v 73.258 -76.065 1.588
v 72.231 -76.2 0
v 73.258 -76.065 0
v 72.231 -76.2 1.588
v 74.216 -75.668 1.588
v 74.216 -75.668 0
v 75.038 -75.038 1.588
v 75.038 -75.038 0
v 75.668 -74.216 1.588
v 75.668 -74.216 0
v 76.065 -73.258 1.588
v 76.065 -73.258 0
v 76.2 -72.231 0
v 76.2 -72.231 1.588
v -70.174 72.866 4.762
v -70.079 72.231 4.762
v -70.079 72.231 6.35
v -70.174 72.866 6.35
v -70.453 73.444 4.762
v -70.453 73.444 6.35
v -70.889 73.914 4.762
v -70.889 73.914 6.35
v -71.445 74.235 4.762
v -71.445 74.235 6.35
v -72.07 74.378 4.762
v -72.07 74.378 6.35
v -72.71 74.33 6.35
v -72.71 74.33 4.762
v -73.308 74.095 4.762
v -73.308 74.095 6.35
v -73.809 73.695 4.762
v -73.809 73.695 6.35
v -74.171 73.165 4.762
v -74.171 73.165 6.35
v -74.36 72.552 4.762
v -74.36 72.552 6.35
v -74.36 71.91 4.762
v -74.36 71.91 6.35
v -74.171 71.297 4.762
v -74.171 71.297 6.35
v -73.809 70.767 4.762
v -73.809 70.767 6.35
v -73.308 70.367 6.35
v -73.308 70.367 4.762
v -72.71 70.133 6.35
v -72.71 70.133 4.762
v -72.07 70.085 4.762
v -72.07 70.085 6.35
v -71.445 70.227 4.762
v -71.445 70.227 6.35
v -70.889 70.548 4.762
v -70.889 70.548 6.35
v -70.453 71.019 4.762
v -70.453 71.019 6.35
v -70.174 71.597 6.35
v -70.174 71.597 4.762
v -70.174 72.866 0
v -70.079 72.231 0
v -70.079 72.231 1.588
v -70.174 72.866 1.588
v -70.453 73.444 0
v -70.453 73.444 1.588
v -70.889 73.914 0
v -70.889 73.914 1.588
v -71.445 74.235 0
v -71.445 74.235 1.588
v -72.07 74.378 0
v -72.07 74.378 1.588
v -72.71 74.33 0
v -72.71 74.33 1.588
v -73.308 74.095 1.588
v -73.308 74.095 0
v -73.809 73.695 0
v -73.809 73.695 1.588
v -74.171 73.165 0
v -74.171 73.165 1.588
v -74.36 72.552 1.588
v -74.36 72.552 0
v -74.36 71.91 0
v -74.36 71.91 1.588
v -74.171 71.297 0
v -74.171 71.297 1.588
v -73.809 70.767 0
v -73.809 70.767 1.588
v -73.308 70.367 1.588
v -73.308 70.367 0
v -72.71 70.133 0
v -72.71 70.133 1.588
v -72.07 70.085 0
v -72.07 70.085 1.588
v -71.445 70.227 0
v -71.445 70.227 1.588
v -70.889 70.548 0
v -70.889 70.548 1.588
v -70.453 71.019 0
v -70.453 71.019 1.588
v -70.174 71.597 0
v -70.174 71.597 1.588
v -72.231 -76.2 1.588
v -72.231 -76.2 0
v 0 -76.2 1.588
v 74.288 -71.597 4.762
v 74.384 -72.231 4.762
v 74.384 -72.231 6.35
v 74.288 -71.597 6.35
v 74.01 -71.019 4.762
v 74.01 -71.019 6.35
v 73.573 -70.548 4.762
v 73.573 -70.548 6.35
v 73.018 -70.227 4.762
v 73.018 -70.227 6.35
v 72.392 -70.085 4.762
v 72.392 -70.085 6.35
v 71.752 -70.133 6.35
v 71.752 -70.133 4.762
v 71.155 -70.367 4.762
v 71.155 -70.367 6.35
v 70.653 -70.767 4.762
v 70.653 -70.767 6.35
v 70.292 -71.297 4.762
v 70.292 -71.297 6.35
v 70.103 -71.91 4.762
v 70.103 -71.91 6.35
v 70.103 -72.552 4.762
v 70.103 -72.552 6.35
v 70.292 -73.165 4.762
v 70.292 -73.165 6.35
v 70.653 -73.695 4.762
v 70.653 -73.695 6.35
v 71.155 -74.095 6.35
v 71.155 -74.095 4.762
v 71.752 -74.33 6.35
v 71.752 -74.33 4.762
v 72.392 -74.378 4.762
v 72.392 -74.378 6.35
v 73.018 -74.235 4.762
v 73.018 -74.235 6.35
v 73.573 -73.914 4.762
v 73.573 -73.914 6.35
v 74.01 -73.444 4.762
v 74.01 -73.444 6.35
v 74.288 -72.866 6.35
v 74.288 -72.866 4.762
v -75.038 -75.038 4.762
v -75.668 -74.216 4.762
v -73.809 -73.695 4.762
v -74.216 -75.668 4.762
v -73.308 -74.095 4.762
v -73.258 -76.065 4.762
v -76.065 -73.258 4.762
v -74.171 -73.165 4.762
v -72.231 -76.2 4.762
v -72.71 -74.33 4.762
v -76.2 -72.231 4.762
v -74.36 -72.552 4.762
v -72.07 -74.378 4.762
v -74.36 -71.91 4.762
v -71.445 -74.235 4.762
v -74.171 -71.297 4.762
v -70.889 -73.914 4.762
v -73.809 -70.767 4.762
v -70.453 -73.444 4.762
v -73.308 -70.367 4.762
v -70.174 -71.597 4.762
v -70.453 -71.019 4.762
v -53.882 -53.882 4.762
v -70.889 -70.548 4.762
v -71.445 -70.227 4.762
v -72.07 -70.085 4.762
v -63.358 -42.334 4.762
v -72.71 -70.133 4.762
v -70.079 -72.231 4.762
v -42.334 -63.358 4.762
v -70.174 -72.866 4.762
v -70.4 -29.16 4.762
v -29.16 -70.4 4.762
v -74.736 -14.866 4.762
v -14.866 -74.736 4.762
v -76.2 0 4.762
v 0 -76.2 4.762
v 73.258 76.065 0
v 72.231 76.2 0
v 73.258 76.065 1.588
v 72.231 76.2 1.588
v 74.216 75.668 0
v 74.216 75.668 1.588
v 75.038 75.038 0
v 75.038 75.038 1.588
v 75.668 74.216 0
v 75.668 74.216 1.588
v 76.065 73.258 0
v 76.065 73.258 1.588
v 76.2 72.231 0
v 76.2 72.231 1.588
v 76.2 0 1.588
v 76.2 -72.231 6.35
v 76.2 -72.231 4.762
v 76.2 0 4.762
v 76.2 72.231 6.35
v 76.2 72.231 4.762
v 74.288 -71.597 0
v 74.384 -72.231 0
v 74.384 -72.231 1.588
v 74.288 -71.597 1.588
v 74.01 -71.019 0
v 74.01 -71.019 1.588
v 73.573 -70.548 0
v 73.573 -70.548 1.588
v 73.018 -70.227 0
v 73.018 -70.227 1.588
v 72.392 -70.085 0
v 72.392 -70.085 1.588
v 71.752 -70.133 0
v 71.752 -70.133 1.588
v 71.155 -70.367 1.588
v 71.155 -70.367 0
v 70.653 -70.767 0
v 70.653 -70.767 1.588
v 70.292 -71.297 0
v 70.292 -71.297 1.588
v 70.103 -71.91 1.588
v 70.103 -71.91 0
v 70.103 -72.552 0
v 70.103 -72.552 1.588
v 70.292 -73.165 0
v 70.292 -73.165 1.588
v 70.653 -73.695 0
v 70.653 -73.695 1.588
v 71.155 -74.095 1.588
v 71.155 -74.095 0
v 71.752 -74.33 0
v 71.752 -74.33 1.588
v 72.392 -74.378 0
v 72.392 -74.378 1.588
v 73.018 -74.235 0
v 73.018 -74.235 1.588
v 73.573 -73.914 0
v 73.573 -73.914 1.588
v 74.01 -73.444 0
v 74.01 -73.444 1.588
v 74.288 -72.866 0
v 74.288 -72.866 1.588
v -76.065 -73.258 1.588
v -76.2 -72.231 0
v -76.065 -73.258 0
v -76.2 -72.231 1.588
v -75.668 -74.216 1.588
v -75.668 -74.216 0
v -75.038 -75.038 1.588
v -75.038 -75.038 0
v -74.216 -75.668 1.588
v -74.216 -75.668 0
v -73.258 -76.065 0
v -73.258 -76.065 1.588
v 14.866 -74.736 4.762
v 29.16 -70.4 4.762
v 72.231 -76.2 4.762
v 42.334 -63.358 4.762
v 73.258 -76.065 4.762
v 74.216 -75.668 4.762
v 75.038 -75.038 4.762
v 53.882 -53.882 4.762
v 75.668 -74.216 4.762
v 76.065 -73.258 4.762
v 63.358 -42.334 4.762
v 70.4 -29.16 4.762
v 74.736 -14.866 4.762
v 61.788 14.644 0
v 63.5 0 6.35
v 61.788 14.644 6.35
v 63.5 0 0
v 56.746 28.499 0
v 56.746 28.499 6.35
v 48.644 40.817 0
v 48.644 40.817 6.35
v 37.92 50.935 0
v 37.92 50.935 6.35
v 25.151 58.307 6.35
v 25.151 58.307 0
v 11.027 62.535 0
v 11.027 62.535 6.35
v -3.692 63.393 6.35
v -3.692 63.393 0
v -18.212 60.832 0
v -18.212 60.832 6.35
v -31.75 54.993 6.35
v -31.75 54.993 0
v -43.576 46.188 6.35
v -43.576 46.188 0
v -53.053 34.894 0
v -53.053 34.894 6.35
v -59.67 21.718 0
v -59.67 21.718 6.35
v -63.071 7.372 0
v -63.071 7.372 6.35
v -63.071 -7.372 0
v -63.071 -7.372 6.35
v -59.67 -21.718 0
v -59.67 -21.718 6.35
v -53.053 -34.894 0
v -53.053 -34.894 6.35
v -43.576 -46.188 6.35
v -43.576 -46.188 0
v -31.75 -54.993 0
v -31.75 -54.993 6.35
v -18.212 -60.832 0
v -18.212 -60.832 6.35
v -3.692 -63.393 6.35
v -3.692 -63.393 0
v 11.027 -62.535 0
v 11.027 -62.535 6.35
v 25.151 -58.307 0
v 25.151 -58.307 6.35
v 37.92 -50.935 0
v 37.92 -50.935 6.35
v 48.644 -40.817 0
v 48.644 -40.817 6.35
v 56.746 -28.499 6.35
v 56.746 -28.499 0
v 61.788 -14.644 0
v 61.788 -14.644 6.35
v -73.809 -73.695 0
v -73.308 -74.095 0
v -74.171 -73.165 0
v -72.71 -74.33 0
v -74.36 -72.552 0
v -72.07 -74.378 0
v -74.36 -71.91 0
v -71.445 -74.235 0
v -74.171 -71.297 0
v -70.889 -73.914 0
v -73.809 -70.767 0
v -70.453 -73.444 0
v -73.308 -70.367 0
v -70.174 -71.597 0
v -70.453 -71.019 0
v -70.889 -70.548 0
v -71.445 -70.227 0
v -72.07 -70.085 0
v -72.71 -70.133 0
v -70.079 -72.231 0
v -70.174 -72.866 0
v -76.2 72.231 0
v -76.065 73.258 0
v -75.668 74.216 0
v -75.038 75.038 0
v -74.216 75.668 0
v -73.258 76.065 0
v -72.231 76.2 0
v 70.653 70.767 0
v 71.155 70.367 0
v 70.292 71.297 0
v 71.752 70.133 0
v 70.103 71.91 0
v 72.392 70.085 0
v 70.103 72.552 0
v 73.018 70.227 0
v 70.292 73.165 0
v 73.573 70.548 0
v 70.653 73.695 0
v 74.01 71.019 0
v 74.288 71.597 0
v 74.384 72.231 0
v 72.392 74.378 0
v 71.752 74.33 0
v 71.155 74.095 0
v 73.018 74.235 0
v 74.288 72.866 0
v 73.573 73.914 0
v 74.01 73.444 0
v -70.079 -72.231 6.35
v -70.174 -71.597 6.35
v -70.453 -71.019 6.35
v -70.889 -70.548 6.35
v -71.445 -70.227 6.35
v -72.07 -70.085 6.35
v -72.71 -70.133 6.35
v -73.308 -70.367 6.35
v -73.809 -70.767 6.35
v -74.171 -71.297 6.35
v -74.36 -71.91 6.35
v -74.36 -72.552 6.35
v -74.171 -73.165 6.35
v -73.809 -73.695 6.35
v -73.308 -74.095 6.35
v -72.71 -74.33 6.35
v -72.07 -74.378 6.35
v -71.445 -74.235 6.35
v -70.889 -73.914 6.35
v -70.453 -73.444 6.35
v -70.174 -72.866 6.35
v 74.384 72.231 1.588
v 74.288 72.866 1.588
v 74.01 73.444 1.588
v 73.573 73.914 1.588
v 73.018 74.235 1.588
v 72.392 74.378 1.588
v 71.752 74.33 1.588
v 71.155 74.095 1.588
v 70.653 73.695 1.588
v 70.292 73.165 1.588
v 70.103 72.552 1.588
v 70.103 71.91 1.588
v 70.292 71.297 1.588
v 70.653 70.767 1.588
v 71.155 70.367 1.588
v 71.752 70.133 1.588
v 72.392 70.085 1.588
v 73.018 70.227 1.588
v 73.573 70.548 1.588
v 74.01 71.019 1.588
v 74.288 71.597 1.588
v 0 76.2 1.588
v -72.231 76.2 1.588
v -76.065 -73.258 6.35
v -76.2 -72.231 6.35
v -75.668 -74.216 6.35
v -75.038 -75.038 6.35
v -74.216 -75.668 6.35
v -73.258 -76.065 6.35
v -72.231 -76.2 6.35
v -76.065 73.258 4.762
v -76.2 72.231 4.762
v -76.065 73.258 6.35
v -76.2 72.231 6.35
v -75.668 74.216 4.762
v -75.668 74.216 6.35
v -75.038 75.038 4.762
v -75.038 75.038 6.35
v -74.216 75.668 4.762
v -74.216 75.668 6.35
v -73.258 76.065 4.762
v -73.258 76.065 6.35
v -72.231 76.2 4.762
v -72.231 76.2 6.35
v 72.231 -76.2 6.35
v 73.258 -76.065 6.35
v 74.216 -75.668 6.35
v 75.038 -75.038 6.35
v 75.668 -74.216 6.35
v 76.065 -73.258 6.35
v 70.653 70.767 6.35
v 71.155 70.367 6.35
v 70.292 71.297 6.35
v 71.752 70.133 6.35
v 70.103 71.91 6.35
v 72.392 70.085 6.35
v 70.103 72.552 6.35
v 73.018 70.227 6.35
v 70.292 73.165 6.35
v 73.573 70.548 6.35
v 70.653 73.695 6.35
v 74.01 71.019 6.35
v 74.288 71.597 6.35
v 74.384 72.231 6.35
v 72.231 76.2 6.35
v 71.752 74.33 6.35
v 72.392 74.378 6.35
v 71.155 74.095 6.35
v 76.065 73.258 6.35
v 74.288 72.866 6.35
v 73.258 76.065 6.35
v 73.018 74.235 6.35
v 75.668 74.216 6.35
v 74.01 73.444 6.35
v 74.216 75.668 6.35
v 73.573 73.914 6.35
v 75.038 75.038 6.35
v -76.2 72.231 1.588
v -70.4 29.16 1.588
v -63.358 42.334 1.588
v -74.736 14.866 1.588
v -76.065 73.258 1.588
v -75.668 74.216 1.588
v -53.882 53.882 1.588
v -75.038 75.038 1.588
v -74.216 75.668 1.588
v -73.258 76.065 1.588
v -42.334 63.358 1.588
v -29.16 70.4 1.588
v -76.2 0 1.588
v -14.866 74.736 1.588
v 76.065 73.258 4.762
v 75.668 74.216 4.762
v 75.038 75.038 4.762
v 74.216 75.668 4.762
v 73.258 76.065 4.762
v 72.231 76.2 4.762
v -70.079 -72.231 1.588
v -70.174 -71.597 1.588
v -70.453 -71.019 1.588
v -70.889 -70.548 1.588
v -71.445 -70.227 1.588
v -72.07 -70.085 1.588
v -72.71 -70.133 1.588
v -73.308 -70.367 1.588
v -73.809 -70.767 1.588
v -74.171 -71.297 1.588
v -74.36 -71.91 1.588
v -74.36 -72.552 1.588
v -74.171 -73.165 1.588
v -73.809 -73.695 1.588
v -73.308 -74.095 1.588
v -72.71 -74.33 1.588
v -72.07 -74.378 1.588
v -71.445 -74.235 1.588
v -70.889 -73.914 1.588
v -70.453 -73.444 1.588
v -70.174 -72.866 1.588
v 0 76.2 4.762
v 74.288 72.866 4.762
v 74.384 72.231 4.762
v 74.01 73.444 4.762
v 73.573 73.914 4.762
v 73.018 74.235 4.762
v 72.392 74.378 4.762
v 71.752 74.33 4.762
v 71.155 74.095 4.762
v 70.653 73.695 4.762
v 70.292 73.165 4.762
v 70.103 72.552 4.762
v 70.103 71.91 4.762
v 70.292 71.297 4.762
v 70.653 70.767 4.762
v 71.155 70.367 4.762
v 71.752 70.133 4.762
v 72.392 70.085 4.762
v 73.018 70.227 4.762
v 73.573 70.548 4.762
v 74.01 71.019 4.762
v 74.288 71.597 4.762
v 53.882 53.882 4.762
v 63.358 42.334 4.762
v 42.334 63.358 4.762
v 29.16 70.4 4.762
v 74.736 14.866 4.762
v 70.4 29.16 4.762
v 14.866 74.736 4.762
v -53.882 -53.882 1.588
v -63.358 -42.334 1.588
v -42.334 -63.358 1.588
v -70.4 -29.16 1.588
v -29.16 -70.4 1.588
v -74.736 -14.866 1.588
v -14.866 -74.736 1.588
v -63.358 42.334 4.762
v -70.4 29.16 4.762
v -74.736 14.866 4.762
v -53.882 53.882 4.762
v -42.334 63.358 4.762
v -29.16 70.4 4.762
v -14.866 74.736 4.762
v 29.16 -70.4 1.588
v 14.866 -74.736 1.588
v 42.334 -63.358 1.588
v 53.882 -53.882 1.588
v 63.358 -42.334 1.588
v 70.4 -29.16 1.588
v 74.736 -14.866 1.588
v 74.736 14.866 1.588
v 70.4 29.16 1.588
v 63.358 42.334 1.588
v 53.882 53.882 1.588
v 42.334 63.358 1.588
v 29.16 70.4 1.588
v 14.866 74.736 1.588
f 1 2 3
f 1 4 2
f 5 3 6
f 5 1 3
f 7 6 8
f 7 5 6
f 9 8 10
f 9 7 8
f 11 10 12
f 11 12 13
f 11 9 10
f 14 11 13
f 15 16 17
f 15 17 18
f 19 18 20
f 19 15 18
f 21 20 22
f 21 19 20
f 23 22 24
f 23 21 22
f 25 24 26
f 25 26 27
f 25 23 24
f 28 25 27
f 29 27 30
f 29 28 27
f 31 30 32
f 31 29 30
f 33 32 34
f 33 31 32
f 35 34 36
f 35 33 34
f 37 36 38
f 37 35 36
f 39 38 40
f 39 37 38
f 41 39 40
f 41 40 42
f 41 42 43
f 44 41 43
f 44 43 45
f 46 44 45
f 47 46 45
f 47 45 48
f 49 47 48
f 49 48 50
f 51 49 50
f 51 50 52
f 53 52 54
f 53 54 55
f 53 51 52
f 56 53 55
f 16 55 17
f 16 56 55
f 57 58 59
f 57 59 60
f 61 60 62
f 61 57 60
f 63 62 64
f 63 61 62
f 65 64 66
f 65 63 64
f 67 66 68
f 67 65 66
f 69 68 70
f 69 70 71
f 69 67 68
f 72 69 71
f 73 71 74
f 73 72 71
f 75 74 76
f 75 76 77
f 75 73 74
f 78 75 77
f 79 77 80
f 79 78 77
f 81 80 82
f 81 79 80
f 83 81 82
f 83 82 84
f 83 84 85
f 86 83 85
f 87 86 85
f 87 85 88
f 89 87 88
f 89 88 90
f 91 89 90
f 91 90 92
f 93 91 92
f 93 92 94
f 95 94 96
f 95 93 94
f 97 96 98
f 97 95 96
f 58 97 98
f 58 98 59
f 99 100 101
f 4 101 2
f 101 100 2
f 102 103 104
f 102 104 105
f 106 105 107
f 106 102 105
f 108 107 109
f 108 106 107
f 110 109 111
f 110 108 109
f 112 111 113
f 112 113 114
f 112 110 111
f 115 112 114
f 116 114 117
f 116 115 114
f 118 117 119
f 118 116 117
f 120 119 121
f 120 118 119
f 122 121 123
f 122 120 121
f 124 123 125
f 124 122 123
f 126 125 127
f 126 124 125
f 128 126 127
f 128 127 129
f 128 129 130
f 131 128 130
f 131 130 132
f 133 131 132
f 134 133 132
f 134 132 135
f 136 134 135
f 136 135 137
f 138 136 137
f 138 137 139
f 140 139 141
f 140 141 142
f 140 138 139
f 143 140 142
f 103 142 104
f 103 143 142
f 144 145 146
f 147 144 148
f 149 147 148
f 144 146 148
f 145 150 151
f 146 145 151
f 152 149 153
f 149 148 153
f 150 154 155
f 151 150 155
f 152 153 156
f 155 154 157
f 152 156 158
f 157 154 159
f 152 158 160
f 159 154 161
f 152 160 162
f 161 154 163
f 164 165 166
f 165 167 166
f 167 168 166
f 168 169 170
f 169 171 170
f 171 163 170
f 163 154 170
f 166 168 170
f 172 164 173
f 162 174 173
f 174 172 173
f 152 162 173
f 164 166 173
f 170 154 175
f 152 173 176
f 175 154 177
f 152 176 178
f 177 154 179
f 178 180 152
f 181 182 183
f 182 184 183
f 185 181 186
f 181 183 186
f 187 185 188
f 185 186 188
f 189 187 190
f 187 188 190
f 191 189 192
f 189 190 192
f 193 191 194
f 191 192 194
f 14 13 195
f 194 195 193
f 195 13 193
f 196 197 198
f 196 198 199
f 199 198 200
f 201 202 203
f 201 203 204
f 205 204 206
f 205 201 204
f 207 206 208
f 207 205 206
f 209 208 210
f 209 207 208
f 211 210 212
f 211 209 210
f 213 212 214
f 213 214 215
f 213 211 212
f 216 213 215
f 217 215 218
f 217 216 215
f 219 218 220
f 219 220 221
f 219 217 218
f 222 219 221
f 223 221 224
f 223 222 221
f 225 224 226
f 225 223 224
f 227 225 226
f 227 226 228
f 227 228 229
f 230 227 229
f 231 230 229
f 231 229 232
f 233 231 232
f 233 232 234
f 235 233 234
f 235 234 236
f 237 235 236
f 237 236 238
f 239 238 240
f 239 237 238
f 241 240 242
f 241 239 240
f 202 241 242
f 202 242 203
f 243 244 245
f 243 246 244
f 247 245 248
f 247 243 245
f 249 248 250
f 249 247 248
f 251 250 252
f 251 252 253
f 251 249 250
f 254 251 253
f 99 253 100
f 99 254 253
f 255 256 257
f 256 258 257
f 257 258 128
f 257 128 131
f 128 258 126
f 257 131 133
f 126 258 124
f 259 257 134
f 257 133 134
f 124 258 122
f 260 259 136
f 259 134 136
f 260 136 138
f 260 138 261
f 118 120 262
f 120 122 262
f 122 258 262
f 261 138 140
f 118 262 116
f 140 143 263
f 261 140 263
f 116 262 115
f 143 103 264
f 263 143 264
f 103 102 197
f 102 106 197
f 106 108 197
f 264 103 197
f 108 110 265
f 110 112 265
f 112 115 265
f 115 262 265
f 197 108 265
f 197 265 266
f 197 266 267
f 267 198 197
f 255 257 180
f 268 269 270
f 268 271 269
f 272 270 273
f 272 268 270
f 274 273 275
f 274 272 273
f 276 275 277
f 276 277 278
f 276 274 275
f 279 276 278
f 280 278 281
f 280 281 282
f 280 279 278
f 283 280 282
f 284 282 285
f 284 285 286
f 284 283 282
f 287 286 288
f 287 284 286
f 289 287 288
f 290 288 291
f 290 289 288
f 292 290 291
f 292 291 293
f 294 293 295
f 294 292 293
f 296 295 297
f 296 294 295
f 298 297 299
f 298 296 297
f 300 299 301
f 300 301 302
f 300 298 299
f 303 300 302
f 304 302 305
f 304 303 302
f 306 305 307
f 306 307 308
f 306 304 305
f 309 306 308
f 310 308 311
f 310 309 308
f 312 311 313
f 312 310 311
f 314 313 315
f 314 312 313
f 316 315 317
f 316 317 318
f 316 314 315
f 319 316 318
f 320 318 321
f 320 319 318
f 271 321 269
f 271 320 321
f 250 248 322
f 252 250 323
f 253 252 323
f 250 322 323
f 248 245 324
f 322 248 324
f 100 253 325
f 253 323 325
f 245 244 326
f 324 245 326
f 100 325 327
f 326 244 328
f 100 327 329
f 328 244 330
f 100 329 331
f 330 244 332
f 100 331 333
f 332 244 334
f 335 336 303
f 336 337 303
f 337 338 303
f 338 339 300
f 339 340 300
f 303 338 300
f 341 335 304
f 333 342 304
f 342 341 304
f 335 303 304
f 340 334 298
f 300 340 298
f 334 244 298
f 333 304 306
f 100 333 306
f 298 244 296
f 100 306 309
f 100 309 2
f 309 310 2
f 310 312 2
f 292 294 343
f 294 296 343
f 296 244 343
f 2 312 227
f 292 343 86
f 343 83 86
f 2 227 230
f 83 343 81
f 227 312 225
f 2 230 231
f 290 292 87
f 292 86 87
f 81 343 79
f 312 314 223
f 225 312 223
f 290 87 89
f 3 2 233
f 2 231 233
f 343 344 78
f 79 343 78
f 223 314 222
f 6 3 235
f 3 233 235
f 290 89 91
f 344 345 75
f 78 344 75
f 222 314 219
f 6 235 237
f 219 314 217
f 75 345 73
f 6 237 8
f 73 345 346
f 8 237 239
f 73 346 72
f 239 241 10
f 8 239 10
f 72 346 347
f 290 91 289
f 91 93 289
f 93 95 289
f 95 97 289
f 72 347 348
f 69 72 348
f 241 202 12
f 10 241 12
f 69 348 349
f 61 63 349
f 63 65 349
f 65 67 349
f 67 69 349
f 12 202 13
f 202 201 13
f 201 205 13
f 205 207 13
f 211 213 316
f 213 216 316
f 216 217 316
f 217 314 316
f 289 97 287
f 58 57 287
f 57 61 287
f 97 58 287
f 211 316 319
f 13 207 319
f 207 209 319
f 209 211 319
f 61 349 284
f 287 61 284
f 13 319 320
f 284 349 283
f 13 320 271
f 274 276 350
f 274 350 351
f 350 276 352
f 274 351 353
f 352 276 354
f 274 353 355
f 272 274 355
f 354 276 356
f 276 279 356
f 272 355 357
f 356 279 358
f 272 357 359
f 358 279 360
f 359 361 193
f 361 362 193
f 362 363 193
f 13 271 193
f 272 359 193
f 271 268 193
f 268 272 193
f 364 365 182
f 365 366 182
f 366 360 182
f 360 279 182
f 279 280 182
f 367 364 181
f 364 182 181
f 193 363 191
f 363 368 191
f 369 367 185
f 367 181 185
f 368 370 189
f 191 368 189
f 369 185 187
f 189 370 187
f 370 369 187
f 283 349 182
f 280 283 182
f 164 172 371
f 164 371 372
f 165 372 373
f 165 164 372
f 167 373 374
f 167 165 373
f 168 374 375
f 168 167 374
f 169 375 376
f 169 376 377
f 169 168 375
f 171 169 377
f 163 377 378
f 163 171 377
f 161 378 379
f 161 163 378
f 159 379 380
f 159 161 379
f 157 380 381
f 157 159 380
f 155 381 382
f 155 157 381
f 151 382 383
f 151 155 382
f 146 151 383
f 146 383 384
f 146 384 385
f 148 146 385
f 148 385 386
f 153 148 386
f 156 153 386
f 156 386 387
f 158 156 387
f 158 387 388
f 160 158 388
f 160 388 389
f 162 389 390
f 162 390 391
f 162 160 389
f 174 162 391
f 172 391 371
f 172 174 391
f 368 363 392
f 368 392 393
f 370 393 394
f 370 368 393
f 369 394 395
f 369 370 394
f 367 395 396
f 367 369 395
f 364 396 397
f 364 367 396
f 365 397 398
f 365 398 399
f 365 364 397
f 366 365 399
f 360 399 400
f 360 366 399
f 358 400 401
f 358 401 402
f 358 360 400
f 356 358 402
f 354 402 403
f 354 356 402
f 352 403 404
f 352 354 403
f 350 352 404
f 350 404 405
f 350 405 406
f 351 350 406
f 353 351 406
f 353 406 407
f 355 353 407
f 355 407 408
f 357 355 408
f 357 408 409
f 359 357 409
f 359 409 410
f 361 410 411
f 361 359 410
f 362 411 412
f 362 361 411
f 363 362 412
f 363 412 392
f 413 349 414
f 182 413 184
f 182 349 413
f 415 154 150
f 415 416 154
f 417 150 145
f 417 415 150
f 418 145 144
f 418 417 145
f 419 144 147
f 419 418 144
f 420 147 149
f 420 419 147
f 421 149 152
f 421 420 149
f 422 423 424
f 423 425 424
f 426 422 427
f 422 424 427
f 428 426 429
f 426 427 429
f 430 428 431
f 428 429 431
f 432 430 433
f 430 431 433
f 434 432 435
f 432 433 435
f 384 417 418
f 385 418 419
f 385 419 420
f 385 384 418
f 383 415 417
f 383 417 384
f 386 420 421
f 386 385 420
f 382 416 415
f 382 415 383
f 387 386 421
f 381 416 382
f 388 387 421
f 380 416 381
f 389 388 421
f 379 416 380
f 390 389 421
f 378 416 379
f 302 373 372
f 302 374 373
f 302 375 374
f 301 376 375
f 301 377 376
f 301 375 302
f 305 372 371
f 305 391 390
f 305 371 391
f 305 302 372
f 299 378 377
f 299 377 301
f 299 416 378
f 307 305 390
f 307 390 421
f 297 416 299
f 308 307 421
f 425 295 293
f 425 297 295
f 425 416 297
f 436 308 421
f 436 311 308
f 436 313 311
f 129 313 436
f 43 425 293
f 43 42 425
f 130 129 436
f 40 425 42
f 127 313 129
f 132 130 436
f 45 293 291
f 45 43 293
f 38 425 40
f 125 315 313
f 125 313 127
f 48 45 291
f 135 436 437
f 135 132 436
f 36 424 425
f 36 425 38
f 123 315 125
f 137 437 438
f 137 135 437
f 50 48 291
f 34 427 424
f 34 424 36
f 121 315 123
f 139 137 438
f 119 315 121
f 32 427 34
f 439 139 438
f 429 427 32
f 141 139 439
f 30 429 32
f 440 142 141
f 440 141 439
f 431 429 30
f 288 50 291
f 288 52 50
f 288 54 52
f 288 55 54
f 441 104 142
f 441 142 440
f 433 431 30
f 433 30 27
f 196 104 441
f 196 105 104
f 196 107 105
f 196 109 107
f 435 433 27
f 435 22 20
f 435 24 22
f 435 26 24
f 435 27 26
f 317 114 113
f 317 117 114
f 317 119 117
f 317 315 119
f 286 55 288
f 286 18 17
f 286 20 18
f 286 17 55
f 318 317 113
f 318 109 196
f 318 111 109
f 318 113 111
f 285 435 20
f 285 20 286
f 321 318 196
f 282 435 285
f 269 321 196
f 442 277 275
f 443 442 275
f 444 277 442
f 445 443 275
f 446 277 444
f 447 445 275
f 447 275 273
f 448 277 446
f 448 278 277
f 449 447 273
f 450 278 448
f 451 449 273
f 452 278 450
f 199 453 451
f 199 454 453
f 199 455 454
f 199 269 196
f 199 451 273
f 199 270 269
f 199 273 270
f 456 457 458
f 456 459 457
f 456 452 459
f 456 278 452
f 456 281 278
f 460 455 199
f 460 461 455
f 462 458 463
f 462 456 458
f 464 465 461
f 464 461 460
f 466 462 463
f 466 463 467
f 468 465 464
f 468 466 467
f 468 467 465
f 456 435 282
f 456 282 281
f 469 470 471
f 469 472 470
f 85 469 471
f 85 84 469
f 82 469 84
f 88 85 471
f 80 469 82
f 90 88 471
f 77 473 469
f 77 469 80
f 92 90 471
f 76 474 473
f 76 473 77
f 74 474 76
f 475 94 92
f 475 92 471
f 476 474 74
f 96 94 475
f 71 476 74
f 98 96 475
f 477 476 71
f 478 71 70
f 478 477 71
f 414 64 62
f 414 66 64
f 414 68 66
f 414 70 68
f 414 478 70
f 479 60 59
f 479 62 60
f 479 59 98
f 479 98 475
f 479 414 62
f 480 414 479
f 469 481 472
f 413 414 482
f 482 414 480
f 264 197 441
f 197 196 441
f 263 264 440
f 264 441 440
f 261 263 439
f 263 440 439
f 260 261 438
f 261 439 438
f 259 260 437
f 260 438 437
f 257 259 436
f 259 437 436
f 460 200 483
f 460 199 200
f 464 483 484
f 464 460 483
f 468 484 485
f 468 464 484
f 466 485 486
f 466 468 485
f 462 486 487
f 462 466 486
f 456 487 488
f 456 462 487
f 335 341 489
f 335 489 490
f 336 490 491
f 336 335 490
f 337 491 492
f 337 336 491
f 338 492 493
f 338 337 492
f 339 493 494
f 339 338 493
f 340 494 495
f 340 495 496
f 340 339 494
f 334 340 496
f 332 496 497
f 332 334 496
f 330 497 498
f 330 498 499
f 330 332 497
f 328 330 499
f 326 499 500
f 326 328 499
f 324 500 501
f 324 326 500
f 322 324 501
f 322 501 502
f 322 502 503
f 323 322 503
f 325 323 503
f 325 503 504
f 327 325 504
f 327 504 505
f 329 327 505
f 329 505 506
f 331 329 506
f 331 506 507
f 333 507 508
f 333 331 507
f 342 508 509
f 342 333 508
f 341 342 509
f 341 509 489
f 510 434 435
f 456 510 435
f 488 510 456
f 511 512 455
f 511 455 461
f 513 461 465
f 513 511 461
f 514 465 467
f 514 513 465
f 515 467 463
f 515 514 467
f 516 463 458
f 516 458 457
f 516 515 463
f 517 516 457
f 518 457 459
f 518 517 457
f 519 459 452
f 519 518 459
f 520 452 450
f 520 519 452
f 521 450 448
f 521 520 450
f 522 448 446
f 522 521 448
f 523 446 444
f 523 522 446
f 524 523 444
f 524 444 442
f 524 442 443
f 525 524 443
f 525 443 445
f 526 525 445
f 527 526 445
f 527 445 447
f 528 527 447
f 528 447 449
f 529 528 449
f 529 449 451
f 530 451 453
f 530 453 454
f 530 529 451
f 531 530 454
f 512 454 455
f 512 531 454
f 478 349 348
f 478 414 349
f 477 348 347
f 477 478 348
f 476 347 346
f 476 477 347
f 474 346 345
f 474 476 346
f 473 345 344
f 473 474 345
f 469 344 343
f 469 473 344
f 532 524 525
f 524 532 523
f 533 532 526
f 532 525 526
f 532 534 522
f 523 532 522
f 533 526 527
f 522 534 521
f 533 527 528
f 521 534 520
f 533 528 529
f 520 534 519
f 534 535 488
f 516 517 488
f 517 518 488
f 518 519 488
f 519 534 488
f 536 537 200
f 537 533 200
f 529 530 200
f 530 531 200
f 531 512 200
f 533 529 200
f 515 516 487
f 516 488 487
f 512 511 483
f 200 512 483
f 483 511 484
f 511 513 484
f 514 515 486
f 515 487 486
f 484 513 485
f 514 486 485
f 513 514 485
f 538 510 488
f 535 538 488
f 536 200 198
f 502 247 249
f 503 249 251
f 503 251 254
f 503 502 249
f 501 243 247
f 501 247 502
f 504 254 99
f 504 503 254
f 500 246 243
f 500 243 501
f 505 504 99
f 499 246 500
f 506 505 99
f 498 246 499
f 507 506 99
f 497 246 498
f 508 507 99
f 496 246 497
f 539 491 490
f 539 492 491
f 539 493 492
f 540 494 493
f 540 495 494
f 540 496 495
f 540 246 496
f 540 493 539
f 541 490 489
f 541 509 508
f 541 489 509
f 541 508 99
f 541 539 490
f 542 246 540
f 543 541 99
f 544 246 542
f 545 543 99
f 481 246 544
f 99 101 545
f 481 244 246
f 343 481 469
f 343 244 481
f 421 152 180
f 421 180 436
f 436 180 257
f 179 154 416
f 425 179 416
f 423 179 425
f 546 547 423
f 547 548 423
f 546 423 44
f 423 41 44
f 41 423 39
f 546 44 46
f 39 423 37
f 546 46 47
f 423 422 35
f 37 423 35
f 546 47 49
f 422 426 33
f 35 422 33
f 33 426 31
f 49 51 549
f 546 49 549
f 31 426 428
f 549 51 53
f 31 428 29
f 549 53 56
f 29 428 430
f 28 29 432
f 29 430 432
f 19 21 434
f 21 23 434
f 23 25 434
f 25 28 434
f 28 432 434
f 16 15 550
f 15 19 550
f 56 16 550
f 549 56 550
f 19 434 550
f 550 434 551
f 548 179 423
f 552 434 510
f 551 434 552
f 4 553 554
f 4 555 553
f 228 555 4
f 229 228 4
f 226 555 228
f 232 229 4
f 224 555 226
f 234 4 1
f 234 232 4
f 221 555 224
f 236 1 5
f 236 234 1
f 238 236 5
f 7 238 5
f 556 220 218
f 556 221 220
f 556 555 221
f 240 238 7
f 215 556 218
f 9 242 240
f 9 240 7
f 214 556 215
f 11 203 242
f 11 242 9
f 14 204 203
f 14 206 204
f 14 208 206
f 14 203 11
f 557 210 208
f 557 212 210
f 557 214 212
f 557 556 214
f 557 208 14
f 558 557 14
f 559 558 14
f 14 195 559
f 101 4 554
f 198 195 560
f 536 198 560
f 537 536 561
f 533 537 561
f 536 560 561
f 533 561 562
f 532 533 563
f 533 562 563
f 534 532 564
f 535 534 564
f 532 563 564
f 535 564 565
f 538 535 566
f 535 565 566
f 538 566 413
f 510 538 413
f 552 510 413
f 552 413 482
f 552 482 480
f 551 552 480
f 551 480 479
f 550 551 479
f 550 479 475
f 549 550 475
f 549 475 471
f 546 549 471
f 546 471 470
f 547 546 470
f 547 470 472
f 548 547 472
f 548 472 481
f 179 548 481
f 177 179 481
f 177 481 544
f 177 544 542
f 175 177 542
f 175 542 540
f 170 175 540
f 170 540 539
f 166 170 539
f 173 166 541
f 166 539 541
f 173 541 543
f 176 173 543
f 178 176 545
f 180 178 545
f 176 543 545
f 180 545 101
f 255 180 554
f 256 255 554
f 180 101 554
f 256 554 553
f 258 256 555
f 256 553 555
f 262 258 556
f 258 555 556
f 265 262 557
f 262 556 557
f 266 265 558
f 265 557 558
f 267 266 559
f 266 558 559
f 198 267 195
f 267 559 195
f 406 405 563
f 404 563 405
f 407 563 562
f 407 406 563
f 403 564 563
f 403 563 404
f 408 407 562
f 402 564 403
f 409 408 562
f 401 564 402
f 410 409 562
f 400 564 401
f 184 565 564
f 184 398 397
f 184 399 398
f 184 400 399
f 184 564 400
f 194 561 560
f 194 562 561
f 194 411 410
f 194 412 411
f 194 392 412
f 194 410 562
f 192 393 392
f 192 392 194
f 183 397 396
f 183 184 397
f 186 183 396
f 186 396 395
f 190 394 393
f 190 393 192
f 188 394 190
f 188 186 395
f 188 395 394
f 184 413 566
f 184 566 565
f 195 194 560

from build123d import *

# Parameters (mm, degrees)
F0_W     = 152.4
F0_H     = 152.4
F0_R     = 2.15265
F0_R_2   = 63.5
F1_DEPTH = 1.5875
F2_R     = 76.2
F2_R_2   = 63.5
F3_DEPTH = 3.175
F4_W     = 152.4
F4_H     = 152.4
F4_R     = 2.15265
F4_R_2   = 63.5
F5_DEPTH = 1.5875
F6_R     = 3.96875


with BuildPart() as f1:
    # F0 (on Top) → F1 (new body)
    with BuildSketch(Plane.XY):
        Rectangle(F0_W, F0_H)
        with Locations((-72.23125, -72.23125)):
            Circle(F0_R, mode=Mode.SUBTRACT)
        with Locations((72.23125, -72.23125)):
            Circle(F0_R, mode=Mode.SUBTRACT)
        with Locations((-72.23125, 72.23125)):
            Circle(F0_R, mode=Mode.SUBTRACT)
        Circle(F0_R_2, mode=Mode.SUBTRACT)
        with Locations((72.23125, 72.23125)):
            Circle(F0_R, mode=Mode.SUBTRACT)
    extrude(amount=F1_DEPTH)

    # F2 (on face) → F3 (join)
    with BuildSketch(Plane.XY.offset(1.5875)):
        Circle(F2_R)
        Circle(F2_R_2, mode=Mode.SUBTRACT)
    extrude(amount=F3_DEPTH)

    # F4 (on face) → F5 (join)
    with BuildSketch(Plane.XY.offset(4.7625)):
        Rectangle(F4_W, F4_H)
        with Locations((-72.23125, -72.23125)):
            Circle(F4_R, mode=Mode.SUBTRACT)
        with Locations((72.23125, -72.23125)):
            Circle(F4_R, mode=Mode.SUBTRACT)
        with Locations((-72.23125, 72.23125)):
            Circle(F4_R, mode=Mode.SUBTRACT)
        Circle(F4_R_2, mode=Mode.SUBTRACT)
        with Locations((72.23125, 72.23125)):
            Circle(F4_R, mode=Mode.SUBTRACT)
    extrude(amount=F5_DEPTH)

    # F6
    f6_edges = [f1.edges().sort_by_distance(p)[0] for p in [
        (-76.2, 76.2, 0.79375),
        (-76.2, -76.2, 0.79375),
        (76.2, -76.2, 0.79375),
        (76.2, 76.2, 0.79375),
        (-76.2, 76.2, 5.55625),
        (-76.2, -76.2, 5.55625),
        (76.2, -76.2, 5.55625),
        (76.2, 76.2, 5.55625),
    ]]
    fillet(f6_edges, radius=F6_R)


solid = f1.part
